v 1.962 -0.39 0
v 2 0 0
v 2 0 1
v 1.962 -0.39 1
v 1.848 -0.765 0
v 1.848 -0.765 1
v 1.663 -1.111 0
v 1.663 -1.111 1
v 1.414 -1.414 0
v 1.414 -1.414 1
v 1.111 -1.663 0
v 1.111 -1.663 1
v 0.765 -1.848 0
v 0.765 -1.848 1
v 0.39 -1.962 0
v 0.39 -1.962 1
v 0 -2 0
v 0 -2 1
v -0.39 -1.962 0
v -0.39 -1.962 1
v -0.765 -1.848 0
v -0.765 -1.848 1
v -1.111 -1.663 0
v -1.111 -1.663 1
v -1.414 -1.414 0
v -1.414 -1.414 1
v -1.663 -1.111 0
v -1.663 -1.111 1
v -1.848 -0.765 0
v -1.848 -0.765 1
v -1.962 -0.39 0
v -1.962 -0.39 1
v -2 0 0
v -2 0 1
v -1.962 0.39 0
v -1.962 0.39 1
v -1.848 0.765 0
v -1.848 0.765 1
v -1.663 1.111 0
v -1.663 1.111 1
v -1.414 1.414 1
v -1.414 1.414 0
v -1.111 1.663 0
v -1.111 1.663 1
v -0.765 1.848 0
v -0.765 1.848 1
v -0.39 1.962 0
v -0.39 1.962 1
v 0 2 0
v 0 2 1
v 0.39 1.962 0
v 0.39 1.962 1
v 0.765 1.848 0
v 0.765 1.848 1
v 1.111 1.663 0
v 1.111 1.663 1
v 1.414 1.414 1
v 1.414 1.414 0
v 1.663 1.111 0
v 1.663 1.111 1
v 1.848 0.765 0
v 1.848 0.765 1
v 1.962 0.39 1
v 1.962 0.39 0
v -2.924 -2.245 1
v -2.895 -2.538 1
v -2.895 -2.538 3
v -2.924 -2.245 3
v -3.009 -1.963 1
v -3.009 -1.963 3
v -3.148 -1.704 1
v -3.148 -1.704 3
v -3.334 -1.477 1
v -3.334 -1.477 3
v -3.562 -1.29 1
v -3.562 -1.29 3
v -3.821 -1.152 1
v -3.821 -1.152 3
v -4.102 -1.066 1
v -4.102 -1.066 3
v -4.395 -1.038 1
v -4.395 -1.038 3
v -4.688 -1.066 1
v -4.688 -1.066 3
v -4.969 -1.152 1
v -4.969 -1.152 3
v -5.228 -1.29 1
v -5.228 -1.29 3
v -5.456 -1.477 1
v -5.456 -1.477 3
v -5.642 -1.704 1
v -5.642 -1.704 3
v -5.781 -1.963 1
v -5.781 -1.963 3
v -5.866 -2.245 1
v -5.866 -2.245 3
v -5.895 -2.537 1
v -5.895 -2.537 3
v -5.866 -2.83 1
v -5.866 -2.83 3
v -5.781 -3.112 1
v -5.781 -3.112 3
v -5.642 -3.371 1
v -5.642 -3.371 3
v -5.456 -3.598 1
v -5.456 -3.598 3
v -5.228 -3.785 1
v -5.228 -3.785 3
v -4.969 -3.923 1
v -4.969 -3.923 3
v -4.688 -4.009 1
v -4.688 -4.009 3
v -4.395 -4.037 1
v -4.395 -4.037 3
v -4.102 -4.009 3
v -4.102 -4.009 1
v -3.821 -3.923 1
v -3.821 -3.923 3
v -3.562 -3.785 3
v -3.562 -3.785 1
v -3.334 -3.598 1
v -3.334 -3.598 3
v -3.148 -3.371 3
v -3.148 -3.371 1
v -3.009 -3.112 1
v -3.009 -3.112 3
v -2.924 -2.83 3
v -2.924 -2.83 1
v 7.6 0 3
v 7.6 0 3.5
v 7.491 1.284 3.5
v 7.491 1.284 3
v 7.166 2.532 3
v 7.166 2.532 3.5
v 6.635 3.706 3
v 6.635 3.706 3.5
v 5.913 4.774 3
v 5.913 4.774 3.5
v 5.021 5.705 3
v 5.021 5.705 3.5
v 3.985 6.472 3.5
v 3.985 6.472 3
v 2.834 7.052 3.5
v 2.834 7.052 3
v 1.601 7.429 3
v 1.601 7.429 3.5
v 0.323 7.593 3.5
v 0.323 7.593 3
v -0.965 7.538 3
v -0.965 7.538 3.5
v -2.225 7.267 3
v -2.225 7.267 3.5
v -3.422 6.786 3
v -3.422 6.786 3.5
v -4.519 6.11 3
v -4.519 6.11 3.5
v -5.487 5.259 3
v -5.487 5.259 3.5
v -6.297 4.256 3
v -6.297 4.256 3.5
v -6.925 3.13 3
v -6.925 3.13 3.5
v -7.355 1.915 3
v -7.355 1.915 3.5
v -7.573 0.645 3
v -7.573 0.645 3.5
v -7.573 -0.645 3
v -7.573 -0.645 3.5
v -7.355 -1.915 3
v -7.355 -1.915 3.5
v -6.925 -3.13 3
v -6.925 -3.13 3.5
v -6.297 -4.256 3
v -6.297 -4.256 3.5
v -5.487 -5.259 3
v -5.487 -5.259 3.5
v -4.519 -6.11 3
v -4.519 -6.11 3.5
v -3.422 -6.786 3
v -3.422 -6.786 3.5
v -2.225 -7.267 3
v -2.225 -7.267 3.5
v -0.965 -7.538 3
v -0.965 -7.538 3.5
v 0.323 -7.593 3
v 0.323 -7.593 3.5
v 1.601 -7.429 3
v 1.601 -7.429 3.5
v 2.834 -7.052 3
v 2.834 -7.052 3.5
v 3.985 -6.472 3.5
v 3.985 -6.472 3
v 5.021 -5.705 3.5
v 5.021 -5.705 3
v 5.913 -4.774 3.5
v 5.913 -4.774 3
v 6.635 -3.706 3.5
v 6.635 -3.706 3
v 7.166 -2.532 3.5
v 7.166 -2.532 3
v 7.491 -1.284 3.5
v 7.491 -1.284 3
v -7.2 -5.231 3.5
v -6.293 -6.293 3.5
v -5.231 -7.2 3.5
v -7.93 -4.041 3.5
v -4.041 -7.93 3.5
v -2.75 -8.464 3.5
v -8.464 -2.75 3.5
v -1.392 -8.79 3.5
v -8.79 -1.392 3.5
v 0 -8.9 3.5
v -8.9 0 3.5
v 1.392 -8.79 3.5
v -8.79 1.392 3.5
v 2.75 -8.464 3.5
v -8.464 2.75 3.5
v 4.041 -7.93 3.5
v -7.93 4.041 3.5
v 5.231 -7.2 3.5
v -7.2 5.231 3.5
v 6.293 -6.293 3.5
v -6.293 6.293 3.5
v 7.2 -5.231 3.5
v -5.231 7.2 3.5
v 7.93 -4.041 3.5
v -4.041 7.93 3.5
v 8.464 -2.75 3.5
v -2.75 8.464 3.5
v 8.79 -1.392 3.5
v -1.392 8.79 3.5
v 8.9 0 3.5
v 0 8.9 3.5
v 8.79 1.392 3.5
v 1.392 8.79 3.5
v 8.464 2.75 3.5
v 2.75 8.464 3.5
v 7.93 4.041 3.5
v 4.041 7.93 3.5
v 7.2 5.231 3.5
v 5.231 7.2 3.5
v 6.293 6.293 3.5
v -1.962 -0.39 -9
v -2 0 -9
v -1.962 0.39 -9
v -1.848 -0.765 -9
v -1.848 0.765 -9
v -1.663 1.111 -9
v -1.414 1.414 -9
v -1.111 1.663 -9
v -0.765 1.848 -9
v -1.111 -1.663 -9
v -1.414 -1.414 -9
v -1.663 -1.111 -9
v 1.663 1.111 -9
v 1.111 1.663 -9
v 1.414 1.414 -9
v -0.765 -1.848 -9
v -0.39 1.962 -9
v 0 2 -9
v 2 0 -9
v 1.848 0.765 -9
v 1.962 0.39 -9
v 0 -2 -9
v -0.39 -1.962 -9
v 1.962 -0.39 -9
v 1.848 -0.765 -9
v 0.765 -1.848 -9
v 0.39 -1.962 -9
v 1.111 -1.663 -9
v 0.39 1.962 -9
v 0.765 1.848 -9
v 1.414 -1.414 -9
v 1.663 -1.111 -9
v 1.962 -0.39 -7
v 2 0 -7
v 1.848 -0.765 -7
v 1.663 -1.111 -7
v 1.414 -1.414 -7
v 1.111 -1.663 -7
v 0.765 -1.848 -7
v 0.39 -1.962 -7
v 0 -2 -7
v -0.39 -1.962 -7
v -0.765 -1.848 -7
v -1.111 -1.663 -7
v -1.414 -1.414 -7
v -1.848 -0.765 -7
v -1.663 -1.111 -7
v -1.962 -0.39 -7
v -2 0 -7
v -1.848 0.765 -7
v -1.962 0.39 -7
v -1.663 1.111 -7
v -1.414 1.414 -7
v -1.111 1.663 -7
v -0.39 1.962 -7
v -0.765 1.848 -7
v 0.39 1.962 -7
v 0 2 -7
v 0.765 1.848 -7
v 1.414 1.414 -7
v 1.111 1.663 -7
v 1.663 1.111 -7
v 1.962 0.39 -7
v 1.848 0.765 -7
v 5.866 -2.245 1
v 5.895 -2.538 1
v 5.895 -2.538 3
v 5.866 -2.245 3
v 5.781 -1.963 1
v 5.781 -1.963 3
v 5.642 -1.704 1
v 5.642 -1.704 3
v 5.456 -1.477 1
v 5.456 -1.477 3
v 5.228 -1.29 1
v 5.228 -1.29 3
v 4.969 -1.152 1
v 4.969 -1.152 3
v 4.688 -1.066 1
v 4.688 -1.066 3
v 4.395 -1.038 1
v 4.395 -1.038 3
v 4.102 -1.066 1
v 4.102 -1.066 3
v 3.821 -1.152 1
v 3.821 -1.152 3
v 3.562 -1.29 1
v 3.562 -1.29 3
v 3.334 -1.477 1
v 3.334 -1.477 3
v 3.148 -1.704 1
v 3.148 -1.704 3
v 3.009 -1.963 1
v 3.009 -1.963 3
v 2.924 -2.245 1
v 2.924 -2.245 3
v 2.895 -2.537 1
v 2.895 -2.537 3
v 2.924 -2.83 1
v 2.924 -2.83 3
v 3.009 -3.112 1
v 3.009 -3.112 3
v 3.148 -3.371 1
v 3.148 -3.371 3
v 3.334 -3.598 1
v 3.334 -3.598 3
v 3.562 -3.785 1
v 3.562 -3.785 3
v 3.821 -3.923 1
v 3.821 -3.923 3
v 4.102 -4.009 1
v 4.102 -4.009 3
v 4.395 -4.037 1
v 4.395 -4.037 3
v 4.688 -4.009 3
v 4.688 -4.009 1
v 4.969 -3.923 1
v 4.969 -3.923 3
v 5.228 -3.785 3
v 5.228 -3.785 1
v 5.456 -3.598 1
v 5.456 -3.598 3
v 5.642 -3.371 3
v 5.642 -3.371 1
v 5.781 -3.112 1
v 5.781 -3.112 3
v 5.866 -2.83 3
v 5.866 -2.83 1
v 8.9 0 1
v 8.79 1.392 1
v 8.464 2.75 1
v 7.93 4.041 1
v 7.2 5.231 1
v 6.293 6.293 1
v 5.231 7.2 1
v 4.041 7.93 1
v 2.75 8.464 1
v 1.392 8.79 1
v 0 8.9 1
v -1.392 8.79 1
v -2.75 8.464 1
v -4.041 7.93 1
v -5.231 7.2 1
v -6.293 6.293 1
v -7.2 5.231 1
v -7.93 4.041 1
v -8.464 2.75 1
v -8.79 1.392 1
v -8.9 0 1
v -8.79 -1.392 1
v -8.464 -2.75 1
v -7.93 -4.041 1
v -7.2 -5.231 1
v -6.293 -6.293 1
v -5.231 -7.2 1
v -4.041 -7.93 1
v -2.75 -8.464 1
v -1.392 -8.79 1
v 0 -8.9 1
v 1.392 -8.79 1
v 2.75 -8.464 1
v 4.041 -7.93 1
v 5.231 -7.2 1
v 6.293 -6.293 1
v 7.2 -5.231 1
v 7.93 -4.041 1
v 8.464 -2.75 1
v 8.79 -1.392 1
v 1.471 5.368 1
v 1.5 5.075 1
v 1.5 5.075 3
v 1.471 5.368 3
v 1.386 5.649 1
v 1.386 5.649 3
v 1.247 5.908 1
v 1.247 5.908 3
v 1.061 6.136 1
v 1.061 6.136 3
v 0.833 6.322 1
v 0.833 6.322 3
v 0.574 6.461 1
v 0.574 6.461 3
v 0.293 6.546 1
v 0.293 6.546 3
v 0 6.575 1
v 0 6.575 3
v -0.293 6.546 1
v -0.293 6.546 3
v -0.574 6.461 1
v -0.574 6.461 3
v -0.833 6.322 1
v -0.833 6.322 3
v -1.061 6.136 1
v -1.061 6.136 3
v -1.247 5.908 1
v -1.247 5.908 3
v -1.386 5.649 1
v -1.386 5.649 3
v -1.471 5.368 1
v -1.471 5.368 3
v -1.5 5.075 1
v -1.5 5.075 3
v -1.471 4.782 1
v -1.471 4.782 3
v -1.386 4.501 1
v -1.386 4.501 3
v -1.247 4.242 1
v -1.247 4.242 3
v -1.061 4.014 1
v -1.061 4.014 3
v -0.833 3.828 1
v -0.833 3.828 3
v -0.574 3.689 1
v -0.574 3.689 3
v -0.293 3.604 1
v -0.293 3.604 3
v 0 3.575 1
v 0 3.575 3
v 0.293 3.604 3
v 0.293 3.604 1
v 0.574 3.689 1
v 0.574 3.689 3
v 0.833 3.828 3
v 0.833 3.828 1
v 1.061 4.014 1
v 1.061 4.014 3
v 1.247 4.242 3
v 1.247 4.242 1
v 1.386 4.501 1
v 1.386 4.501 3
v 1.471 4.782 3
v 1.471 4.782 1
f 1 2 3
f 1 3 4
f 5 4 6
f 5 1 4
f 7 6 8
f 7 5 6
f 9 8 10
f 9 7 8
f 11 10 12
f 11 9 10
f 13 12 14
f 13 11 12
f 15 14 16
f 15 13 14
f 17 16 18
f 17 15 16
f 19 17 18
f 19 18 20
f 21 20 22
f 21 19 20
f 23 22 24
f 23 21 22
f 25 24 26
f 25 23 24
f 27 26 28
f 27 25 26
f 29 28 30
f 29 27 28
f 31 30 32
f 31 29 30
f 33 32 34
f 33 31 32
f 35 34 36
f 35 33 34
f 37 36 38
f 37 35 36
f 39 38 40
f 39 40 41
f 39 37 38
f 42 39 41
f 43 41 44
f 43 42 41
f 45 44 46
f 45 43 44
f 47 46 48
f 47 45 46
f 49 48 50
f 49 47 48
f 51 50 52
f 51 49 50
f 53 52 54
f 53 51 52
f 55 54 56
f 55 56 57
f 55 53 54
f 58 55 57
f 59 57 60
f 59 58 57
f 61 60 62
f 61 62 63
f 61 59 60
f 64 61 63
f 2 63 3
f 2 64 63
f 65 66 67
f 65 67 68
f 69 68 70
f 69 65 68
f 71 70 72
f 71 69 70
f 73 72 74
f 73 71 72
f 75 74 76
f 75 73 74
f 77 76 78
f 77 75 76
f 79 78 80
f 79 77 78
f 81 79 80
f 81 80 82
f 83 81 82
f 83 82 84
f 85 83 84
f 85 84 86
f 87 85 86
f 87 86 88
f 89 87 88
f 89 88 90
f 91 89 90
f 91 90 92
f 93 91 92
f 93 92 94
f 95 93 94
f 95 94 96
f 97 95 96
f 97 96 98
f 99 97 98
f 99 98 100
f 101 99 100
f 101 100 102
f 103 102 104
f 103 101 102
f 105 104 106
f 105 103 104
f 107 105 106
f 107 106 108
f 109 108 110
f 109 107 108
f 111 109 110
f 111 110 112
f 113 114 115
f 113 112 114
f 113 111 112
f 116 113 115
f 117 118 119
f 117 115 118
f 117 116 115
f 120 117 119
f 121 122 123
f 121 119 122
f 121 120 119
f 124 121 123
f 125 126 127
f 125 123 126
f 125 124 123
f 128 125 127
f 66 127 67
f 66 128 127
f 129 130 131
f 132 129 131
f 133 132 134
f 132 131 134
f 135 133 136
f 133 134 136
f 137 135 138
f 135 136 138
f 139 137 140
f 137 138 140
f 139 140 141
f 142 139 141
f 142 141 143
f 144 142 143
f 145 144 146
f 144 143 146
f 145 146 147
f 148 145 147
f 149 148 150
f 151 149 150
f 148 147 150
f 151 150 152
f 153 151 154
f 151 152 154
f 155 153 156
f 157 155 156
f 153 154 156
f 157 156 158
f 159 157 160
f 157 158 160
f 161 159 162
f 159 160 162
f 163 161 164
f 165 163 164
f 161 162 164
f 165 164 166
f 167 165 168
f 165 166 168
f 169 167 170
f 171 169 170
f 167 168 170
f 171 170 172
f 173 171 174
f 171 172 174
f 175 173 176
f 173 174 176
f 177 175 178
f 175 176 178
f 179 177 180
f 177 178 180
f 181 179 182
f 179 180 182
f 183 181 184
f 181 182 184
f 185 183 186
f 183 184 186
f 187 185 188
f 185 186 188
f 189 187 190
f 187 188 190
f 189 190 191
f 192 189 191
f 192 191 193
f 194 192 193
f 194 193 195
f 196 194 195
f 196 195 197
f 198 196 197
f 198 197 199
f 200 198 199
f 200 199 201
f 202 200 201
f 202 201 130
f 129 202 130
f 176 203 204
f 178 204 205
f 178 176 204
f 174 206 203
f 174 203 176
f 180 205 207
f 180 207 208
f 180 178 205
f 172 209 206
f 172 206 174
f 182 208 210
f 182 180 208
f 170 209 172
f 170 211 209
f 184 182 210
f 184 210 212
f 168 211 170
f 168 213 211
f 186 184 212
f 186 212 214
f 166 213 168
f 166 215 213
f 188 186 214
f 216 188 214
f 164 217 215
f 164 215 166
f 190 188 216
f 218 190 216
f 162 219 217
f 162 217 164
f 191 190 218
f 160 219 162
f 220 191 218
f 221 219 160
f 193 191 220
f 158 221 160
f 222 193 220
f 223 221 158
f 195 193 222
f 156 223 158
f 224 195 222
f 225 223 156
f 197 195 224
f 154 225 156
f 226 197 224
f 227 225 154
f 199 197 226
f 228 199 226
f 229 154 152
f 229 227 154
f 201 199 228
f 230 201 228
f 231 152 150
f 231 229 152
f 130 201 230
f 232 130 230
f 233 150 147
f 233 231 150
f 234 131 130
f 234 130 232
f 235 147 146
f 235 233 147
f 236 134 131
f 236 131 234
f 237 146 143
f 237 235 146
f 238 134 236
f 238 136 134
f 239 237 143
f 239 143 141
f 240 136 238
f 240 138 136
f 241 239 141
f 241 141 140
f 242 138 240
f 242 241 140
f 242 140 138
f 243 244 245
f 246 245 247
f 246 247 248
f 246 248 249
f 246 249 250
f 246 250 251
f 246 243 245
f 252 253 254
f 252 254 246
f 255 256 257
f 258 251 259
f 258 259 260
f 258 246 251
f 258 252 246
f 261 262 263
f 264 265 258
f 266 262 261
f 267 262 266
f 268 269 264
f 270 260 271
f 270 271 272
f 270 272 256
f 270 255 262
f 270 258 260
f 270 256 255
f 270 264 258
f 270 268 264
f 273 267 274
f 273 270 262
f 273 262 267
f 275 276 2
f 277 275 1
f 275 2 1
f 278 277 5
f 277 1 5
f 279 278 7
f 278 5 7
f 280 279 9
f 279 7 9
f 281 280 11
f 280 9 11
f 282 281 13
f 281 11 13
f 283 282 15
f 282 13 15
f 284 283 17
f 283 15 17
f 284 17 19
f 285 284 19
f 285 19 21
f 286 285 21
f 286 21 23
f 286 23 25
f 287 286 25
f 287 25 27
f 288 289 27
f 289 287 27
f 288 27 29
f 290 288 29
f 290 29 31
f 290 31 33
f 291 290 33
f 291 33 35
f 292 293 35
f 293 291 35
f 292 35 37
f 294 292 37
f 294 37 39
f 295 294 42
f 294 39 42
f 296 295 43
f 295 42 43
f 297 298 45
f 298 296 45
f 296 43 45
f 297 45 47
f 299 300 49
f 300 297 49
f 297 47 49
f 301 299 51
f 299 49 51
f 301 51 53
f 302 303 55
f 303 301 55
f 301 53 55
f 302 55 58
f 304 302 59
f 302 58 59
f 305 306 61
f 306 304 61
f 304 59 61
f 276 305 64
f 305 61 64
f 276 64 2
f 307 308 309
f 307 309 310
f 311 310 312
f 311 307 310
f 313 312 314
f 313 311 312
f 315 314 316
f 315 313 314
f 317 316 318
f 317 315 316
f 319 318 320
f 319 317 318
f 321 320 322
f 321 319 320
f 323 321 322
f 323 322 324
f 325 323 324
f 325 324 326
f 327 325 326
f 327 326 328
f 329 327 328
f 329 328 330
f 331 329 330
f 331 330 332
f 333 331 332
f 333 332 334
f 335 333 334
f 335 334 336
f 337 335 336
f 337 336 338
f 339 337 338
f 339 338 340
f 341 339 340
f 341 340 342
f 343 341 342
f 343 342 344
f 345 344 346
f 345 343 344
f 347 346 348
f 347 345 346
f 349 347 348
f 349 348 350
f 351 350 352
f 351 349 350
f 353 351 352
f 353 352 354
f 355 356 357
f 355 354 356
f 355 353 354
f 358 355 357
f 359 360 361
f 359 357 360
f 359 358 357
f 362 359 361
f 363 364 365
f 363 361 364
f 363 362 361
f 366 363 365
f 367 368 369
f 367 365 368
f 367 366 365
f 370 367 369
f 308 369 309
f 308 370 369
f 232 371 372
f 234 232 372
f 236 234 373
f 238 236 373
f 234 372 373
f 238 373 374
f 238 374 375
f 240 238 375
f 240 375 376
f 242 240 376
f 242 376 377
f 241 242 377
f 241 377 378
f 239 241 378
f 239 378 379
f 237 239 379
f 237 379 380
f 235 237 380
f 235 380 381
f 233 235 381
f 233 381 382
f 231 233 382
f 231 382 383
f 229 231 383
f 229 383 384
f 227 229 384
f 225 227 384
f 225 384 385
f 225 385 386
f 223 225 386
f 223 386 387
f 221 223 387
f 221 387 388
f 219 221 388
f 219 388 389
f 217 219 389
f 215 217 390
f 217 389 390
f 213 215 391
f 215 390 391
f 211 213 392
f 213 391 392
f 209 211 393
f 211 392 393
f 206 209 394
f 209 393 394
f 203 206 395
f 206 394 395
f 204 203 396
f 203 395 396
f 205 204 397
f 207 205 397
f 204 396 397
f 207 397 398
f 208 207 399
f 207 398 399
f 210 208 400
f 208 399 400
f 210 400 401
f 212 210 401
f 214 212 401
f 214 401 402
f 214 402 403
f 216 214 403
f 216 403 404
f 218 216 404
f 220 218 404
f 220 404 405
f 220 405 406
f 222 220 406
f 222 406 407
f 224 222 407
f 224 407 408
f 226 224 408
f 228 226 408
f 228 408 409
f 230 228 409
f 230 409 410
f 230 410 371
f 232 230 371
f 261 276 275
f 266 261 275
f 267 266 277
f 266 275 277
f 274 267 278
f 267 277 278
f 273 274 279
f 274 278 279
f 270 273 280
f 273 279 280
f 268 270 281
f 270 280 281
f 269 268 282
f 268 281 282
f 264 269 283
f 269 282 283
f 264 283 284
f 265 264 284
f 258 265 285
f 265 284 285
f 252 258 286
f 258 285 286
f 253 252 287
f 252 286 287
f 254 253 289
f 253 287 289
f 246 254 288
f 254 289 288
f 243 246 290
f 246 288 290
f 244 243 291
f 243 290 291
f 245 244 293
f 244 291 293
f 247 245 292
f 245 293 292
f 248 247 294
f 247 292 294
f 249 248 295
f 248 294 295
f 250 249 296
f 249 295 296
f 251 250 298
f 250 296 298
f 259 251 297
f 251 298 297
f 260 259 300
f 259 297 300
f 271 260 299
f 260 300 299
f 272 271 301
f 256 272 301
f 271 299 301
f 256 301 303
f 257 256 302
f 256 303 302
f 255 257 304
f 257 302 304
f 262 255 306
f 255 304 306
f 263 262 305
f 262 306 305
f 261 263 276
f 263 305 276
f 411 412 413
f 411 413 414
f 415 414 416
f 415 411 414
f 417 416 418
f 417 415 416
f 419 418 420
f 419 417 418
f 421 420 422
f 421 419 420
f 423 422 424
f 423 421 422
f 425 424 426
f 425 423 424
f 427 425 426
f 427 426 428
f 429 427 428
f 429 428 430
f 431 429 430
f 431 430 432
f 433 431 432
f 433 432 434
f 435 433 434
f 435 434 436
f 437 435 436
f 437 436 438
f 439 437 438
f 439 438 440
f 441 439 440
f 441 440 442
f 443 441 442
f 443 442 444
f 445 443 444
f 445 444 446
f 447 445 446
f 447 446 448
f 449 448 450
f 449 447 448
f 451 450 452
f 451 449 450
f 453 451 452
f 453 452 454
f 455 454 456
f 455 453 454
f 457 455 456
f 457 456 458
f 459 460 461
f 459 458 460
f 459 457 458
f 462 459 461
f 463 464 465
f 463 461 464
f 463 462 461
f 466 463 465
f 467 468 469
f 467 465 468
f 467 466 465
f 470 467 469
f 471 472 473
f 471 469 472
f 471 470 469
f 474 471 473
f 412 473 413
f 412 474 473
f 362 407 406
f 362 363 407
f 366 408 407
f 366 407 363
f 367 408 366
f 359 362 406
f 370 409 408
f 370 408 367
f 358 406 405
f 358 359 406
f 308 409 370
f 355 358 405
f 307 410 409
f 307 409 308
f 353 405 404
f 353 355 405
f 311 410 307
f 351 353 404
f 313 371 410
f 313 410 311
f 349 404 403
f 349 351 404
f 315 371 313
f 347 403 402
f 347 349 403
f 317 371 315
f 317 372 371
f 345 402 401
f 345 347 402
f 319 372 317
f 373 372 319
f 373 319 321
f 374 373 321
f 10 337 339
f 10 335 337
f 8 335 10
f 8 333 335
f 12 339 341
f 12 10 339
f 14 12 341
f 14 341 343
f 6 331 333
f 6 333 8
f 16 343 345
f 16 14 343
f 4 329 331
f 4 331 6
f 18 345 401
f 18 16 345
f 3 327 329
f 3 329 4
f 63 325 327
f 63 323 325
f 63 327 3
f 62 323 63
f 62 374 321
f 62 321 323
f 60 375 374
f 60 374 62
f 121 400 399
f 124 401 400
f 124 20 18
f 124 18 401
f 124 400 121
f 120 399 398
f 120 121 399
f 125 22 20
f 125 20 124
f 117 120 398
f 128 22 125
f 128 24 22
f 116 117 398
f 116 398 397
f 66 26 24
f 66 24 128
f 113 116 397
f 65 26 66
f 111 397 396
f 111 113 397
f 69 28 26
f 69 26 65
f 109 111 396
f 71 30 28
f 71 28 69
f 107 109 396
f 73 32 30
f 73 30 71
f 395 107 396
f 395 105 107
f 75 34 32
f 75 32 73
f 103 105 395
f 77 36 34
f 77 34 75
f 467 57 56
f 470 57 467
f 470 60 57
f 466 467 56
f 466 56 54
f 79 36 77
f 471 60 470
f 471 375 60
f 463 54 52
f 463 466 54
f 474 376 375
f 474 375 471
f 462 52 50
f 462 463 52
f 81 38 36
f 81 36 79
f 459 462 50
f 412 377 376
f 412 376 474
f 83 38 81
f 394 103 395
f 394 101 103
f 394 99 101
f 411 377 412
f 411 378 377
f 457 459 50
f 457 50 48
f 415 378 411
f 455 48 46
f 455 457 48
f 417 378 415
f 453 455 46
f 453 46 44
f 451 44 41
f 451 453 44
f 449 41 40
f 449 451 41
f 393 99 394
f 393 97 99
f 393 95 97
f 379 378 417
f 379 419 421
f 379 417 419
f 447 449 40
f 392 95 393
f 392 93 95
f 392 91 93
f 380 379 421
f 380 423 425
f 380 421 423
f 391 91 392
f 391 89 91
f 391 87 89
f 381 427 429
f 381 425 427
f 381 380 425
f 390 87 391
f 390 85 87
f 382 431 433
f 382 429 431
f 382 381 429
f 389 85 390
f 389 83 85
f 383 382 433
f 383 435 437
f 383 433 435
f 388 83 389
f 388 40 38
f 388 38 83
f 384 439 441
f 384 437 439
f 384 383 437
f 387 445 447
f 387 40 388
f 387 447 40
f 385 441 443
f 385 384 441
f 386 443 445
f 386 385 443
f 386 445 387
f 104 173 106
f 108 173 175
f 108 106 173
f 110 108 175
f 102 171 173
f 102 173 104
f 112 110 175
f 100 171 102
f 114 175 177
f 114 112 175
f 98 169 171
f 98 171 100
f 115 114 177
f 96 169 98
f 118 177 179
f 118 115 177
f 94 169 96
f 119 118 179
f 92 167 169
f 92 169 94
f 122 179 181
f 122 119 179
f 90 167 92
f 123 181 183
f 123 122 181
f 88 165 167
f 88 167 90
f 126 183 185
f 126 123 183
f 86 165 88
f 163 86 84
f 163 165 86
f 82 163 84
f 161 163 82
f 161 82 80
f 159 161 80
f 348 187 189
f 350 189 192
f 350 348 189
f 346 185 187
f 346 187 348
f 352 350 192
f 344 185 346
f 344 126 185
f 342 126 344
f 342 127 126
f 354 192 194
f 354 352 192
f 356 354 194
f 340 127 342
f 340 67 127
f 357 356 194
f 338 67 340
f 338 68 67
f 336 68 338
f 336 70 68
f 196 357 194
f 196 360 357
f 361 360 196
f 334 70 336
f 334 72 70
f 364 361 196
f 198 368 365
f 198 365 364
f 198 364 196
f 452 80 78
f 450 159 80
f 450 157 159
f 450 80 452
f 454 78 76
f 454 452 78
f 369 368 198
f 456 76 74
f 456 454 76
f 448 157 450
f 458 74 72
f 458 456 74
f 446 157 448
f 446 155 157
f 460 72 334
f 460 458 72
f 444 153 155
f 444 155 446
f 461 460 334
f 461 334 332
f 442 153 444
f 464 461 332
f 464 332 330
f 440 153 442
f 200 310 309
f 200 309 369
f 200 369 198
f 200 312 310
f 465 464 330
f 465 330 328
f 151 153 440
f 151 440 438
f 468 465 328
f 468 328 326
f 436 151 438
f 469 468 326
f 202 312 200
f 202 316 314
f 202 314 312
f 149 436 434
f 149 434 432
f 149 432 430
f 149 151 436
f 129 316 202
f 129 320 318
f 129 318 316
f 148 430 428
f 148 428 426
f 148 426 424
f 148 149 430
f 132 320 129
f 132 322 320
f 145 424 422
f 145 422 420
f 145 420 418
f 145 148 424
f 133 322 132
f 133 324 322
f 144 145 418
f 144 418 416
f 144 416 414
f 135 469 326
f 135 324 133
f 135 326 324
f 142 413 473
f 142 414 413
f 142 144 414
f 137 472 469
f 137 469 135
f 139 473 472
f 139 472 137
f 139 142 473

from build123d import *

# Parameters (mm, degrees)
SKETCH_1_R          = 8.9
SKETCH_1_R_2        = 1.5
EXTRUDE_1_DEPTH     = 3.5
SKETCH_2_R          = 7.6
CUT_EXTRUDE_1_DEPTH = 0.5
SKETCH_3_R          = 2
EXTRUDE_2_DEPTH     = 13
SKETCH_8_R          = 4
EXTRUDE_4_DEPTH     = 10
CUT_EXTRUDE_START   = -11.5
SKETCH_13_R         = 4
CUT_EXTRUDE_3_DEPTH = 11.5
SKETCH_16_R         = 8.9
SKETCH_16_R_2       = 2
CUT_EXTRUDE_5_DEPTH = 1
SKETCH_17_R         = 2
EXTRUDE_5_DEPTH     = 2


with BuildPart() as part:
    # 草图1 → 凸台-拉伸1 (new body)
    with BuildSketch(Plane.XY):
        Circle(SKETCH_1_R)
        with Locations((0, 5.075)):
            Circle(SKETCH_1_R_2, mode=Mode.SUBTRACT)
        with Locations((4.395078924, -2.5375)):
            Circle(SKETCH_1_R_2, mode=Mode.SUBTRACT)
        with Locations((-4.395078924, -2.5375)):
            Circle(SKETCH_1_R_2, mode=Mode.SUBTRACT)
    extrude(amount=EXTRUDE_1_DEPTH)

    # 草图2 → 切除-拉伸1 (cut)
    with BuildSketch(Plane.XY.offset(3.5)):
        Circle(SKETCH_2_R)
    extrude(amount=-CUT_EXTRUDE_1_DEPTH, mode=Mode.SUBTRACT)

    # 草图3 → 凸台-拉伸2 (add)
    with BuildSketch(Plane(origin=(0, 0, 0), x_dir=(-1, 0, 0), z_dir=(0, 0, -1))):
        with Locations(Location((0, 0, 0), (0, 0, 180))):
            Circle(SKETCH_3_R)
    extrude(amount=EXTRUDE_2_DEPTH)

    # 草图8 → 凸台-拉伸4 (add)
    with BuildSketch(Plane(origin=(0, 0, -8.5), x_dir=(-1, 0, 0), z_dir=(0, 0, -1))):
        Circle(SKETCH_8_R)
    extrude(amount=EXTRUDE_4_DEPTH)

    # 草图13 → 切除-拉伸3 (cut)
    with BuildSketch(Plane(origin=(0, 0, -18.5), x_dir=(-1, 0, 0), z_dir=(0, 0, -1)).offset(CUT_EXTRUDE_START)):
        Circle(SKETCH_13_R)
    extrude(amount=CUT_EXTRUDE_3_DEPTH, mode=Mode.SUBTRACT)

    # 草图16 → 切除-拉伸5 (cut)
    with BuildSketch(Plane(origin=(0, 0, 0), x_dir=(-1, 0, 0), z_dir=(0, 0, -1))):
        Circle(SKETCH_16_R)
        with Locations(Location((0, 0, 0), (0, 0, 180))):
            Circle(SKETCH_16_R_2, mode=Mode.SUBTRACT)
    extrude(amount=-CUT_EXTRUDE_5_DEPTH, mode=Mode.SUBTRACT)

    # 草图17 → 凸台-拉伸5 (add)
    with BuildSketch(Plane(origin=(0, 0, -7), x_dir=(-1, 0, 0), z_dir=(0, 0, -1))):
        with Locations(Location((0, 0, 0), (0, 0, 180))):
            Circle(SKETCH_17_R)
    extrude(amount=EXTRUDE_5_DEPTH)


solid = part.part
